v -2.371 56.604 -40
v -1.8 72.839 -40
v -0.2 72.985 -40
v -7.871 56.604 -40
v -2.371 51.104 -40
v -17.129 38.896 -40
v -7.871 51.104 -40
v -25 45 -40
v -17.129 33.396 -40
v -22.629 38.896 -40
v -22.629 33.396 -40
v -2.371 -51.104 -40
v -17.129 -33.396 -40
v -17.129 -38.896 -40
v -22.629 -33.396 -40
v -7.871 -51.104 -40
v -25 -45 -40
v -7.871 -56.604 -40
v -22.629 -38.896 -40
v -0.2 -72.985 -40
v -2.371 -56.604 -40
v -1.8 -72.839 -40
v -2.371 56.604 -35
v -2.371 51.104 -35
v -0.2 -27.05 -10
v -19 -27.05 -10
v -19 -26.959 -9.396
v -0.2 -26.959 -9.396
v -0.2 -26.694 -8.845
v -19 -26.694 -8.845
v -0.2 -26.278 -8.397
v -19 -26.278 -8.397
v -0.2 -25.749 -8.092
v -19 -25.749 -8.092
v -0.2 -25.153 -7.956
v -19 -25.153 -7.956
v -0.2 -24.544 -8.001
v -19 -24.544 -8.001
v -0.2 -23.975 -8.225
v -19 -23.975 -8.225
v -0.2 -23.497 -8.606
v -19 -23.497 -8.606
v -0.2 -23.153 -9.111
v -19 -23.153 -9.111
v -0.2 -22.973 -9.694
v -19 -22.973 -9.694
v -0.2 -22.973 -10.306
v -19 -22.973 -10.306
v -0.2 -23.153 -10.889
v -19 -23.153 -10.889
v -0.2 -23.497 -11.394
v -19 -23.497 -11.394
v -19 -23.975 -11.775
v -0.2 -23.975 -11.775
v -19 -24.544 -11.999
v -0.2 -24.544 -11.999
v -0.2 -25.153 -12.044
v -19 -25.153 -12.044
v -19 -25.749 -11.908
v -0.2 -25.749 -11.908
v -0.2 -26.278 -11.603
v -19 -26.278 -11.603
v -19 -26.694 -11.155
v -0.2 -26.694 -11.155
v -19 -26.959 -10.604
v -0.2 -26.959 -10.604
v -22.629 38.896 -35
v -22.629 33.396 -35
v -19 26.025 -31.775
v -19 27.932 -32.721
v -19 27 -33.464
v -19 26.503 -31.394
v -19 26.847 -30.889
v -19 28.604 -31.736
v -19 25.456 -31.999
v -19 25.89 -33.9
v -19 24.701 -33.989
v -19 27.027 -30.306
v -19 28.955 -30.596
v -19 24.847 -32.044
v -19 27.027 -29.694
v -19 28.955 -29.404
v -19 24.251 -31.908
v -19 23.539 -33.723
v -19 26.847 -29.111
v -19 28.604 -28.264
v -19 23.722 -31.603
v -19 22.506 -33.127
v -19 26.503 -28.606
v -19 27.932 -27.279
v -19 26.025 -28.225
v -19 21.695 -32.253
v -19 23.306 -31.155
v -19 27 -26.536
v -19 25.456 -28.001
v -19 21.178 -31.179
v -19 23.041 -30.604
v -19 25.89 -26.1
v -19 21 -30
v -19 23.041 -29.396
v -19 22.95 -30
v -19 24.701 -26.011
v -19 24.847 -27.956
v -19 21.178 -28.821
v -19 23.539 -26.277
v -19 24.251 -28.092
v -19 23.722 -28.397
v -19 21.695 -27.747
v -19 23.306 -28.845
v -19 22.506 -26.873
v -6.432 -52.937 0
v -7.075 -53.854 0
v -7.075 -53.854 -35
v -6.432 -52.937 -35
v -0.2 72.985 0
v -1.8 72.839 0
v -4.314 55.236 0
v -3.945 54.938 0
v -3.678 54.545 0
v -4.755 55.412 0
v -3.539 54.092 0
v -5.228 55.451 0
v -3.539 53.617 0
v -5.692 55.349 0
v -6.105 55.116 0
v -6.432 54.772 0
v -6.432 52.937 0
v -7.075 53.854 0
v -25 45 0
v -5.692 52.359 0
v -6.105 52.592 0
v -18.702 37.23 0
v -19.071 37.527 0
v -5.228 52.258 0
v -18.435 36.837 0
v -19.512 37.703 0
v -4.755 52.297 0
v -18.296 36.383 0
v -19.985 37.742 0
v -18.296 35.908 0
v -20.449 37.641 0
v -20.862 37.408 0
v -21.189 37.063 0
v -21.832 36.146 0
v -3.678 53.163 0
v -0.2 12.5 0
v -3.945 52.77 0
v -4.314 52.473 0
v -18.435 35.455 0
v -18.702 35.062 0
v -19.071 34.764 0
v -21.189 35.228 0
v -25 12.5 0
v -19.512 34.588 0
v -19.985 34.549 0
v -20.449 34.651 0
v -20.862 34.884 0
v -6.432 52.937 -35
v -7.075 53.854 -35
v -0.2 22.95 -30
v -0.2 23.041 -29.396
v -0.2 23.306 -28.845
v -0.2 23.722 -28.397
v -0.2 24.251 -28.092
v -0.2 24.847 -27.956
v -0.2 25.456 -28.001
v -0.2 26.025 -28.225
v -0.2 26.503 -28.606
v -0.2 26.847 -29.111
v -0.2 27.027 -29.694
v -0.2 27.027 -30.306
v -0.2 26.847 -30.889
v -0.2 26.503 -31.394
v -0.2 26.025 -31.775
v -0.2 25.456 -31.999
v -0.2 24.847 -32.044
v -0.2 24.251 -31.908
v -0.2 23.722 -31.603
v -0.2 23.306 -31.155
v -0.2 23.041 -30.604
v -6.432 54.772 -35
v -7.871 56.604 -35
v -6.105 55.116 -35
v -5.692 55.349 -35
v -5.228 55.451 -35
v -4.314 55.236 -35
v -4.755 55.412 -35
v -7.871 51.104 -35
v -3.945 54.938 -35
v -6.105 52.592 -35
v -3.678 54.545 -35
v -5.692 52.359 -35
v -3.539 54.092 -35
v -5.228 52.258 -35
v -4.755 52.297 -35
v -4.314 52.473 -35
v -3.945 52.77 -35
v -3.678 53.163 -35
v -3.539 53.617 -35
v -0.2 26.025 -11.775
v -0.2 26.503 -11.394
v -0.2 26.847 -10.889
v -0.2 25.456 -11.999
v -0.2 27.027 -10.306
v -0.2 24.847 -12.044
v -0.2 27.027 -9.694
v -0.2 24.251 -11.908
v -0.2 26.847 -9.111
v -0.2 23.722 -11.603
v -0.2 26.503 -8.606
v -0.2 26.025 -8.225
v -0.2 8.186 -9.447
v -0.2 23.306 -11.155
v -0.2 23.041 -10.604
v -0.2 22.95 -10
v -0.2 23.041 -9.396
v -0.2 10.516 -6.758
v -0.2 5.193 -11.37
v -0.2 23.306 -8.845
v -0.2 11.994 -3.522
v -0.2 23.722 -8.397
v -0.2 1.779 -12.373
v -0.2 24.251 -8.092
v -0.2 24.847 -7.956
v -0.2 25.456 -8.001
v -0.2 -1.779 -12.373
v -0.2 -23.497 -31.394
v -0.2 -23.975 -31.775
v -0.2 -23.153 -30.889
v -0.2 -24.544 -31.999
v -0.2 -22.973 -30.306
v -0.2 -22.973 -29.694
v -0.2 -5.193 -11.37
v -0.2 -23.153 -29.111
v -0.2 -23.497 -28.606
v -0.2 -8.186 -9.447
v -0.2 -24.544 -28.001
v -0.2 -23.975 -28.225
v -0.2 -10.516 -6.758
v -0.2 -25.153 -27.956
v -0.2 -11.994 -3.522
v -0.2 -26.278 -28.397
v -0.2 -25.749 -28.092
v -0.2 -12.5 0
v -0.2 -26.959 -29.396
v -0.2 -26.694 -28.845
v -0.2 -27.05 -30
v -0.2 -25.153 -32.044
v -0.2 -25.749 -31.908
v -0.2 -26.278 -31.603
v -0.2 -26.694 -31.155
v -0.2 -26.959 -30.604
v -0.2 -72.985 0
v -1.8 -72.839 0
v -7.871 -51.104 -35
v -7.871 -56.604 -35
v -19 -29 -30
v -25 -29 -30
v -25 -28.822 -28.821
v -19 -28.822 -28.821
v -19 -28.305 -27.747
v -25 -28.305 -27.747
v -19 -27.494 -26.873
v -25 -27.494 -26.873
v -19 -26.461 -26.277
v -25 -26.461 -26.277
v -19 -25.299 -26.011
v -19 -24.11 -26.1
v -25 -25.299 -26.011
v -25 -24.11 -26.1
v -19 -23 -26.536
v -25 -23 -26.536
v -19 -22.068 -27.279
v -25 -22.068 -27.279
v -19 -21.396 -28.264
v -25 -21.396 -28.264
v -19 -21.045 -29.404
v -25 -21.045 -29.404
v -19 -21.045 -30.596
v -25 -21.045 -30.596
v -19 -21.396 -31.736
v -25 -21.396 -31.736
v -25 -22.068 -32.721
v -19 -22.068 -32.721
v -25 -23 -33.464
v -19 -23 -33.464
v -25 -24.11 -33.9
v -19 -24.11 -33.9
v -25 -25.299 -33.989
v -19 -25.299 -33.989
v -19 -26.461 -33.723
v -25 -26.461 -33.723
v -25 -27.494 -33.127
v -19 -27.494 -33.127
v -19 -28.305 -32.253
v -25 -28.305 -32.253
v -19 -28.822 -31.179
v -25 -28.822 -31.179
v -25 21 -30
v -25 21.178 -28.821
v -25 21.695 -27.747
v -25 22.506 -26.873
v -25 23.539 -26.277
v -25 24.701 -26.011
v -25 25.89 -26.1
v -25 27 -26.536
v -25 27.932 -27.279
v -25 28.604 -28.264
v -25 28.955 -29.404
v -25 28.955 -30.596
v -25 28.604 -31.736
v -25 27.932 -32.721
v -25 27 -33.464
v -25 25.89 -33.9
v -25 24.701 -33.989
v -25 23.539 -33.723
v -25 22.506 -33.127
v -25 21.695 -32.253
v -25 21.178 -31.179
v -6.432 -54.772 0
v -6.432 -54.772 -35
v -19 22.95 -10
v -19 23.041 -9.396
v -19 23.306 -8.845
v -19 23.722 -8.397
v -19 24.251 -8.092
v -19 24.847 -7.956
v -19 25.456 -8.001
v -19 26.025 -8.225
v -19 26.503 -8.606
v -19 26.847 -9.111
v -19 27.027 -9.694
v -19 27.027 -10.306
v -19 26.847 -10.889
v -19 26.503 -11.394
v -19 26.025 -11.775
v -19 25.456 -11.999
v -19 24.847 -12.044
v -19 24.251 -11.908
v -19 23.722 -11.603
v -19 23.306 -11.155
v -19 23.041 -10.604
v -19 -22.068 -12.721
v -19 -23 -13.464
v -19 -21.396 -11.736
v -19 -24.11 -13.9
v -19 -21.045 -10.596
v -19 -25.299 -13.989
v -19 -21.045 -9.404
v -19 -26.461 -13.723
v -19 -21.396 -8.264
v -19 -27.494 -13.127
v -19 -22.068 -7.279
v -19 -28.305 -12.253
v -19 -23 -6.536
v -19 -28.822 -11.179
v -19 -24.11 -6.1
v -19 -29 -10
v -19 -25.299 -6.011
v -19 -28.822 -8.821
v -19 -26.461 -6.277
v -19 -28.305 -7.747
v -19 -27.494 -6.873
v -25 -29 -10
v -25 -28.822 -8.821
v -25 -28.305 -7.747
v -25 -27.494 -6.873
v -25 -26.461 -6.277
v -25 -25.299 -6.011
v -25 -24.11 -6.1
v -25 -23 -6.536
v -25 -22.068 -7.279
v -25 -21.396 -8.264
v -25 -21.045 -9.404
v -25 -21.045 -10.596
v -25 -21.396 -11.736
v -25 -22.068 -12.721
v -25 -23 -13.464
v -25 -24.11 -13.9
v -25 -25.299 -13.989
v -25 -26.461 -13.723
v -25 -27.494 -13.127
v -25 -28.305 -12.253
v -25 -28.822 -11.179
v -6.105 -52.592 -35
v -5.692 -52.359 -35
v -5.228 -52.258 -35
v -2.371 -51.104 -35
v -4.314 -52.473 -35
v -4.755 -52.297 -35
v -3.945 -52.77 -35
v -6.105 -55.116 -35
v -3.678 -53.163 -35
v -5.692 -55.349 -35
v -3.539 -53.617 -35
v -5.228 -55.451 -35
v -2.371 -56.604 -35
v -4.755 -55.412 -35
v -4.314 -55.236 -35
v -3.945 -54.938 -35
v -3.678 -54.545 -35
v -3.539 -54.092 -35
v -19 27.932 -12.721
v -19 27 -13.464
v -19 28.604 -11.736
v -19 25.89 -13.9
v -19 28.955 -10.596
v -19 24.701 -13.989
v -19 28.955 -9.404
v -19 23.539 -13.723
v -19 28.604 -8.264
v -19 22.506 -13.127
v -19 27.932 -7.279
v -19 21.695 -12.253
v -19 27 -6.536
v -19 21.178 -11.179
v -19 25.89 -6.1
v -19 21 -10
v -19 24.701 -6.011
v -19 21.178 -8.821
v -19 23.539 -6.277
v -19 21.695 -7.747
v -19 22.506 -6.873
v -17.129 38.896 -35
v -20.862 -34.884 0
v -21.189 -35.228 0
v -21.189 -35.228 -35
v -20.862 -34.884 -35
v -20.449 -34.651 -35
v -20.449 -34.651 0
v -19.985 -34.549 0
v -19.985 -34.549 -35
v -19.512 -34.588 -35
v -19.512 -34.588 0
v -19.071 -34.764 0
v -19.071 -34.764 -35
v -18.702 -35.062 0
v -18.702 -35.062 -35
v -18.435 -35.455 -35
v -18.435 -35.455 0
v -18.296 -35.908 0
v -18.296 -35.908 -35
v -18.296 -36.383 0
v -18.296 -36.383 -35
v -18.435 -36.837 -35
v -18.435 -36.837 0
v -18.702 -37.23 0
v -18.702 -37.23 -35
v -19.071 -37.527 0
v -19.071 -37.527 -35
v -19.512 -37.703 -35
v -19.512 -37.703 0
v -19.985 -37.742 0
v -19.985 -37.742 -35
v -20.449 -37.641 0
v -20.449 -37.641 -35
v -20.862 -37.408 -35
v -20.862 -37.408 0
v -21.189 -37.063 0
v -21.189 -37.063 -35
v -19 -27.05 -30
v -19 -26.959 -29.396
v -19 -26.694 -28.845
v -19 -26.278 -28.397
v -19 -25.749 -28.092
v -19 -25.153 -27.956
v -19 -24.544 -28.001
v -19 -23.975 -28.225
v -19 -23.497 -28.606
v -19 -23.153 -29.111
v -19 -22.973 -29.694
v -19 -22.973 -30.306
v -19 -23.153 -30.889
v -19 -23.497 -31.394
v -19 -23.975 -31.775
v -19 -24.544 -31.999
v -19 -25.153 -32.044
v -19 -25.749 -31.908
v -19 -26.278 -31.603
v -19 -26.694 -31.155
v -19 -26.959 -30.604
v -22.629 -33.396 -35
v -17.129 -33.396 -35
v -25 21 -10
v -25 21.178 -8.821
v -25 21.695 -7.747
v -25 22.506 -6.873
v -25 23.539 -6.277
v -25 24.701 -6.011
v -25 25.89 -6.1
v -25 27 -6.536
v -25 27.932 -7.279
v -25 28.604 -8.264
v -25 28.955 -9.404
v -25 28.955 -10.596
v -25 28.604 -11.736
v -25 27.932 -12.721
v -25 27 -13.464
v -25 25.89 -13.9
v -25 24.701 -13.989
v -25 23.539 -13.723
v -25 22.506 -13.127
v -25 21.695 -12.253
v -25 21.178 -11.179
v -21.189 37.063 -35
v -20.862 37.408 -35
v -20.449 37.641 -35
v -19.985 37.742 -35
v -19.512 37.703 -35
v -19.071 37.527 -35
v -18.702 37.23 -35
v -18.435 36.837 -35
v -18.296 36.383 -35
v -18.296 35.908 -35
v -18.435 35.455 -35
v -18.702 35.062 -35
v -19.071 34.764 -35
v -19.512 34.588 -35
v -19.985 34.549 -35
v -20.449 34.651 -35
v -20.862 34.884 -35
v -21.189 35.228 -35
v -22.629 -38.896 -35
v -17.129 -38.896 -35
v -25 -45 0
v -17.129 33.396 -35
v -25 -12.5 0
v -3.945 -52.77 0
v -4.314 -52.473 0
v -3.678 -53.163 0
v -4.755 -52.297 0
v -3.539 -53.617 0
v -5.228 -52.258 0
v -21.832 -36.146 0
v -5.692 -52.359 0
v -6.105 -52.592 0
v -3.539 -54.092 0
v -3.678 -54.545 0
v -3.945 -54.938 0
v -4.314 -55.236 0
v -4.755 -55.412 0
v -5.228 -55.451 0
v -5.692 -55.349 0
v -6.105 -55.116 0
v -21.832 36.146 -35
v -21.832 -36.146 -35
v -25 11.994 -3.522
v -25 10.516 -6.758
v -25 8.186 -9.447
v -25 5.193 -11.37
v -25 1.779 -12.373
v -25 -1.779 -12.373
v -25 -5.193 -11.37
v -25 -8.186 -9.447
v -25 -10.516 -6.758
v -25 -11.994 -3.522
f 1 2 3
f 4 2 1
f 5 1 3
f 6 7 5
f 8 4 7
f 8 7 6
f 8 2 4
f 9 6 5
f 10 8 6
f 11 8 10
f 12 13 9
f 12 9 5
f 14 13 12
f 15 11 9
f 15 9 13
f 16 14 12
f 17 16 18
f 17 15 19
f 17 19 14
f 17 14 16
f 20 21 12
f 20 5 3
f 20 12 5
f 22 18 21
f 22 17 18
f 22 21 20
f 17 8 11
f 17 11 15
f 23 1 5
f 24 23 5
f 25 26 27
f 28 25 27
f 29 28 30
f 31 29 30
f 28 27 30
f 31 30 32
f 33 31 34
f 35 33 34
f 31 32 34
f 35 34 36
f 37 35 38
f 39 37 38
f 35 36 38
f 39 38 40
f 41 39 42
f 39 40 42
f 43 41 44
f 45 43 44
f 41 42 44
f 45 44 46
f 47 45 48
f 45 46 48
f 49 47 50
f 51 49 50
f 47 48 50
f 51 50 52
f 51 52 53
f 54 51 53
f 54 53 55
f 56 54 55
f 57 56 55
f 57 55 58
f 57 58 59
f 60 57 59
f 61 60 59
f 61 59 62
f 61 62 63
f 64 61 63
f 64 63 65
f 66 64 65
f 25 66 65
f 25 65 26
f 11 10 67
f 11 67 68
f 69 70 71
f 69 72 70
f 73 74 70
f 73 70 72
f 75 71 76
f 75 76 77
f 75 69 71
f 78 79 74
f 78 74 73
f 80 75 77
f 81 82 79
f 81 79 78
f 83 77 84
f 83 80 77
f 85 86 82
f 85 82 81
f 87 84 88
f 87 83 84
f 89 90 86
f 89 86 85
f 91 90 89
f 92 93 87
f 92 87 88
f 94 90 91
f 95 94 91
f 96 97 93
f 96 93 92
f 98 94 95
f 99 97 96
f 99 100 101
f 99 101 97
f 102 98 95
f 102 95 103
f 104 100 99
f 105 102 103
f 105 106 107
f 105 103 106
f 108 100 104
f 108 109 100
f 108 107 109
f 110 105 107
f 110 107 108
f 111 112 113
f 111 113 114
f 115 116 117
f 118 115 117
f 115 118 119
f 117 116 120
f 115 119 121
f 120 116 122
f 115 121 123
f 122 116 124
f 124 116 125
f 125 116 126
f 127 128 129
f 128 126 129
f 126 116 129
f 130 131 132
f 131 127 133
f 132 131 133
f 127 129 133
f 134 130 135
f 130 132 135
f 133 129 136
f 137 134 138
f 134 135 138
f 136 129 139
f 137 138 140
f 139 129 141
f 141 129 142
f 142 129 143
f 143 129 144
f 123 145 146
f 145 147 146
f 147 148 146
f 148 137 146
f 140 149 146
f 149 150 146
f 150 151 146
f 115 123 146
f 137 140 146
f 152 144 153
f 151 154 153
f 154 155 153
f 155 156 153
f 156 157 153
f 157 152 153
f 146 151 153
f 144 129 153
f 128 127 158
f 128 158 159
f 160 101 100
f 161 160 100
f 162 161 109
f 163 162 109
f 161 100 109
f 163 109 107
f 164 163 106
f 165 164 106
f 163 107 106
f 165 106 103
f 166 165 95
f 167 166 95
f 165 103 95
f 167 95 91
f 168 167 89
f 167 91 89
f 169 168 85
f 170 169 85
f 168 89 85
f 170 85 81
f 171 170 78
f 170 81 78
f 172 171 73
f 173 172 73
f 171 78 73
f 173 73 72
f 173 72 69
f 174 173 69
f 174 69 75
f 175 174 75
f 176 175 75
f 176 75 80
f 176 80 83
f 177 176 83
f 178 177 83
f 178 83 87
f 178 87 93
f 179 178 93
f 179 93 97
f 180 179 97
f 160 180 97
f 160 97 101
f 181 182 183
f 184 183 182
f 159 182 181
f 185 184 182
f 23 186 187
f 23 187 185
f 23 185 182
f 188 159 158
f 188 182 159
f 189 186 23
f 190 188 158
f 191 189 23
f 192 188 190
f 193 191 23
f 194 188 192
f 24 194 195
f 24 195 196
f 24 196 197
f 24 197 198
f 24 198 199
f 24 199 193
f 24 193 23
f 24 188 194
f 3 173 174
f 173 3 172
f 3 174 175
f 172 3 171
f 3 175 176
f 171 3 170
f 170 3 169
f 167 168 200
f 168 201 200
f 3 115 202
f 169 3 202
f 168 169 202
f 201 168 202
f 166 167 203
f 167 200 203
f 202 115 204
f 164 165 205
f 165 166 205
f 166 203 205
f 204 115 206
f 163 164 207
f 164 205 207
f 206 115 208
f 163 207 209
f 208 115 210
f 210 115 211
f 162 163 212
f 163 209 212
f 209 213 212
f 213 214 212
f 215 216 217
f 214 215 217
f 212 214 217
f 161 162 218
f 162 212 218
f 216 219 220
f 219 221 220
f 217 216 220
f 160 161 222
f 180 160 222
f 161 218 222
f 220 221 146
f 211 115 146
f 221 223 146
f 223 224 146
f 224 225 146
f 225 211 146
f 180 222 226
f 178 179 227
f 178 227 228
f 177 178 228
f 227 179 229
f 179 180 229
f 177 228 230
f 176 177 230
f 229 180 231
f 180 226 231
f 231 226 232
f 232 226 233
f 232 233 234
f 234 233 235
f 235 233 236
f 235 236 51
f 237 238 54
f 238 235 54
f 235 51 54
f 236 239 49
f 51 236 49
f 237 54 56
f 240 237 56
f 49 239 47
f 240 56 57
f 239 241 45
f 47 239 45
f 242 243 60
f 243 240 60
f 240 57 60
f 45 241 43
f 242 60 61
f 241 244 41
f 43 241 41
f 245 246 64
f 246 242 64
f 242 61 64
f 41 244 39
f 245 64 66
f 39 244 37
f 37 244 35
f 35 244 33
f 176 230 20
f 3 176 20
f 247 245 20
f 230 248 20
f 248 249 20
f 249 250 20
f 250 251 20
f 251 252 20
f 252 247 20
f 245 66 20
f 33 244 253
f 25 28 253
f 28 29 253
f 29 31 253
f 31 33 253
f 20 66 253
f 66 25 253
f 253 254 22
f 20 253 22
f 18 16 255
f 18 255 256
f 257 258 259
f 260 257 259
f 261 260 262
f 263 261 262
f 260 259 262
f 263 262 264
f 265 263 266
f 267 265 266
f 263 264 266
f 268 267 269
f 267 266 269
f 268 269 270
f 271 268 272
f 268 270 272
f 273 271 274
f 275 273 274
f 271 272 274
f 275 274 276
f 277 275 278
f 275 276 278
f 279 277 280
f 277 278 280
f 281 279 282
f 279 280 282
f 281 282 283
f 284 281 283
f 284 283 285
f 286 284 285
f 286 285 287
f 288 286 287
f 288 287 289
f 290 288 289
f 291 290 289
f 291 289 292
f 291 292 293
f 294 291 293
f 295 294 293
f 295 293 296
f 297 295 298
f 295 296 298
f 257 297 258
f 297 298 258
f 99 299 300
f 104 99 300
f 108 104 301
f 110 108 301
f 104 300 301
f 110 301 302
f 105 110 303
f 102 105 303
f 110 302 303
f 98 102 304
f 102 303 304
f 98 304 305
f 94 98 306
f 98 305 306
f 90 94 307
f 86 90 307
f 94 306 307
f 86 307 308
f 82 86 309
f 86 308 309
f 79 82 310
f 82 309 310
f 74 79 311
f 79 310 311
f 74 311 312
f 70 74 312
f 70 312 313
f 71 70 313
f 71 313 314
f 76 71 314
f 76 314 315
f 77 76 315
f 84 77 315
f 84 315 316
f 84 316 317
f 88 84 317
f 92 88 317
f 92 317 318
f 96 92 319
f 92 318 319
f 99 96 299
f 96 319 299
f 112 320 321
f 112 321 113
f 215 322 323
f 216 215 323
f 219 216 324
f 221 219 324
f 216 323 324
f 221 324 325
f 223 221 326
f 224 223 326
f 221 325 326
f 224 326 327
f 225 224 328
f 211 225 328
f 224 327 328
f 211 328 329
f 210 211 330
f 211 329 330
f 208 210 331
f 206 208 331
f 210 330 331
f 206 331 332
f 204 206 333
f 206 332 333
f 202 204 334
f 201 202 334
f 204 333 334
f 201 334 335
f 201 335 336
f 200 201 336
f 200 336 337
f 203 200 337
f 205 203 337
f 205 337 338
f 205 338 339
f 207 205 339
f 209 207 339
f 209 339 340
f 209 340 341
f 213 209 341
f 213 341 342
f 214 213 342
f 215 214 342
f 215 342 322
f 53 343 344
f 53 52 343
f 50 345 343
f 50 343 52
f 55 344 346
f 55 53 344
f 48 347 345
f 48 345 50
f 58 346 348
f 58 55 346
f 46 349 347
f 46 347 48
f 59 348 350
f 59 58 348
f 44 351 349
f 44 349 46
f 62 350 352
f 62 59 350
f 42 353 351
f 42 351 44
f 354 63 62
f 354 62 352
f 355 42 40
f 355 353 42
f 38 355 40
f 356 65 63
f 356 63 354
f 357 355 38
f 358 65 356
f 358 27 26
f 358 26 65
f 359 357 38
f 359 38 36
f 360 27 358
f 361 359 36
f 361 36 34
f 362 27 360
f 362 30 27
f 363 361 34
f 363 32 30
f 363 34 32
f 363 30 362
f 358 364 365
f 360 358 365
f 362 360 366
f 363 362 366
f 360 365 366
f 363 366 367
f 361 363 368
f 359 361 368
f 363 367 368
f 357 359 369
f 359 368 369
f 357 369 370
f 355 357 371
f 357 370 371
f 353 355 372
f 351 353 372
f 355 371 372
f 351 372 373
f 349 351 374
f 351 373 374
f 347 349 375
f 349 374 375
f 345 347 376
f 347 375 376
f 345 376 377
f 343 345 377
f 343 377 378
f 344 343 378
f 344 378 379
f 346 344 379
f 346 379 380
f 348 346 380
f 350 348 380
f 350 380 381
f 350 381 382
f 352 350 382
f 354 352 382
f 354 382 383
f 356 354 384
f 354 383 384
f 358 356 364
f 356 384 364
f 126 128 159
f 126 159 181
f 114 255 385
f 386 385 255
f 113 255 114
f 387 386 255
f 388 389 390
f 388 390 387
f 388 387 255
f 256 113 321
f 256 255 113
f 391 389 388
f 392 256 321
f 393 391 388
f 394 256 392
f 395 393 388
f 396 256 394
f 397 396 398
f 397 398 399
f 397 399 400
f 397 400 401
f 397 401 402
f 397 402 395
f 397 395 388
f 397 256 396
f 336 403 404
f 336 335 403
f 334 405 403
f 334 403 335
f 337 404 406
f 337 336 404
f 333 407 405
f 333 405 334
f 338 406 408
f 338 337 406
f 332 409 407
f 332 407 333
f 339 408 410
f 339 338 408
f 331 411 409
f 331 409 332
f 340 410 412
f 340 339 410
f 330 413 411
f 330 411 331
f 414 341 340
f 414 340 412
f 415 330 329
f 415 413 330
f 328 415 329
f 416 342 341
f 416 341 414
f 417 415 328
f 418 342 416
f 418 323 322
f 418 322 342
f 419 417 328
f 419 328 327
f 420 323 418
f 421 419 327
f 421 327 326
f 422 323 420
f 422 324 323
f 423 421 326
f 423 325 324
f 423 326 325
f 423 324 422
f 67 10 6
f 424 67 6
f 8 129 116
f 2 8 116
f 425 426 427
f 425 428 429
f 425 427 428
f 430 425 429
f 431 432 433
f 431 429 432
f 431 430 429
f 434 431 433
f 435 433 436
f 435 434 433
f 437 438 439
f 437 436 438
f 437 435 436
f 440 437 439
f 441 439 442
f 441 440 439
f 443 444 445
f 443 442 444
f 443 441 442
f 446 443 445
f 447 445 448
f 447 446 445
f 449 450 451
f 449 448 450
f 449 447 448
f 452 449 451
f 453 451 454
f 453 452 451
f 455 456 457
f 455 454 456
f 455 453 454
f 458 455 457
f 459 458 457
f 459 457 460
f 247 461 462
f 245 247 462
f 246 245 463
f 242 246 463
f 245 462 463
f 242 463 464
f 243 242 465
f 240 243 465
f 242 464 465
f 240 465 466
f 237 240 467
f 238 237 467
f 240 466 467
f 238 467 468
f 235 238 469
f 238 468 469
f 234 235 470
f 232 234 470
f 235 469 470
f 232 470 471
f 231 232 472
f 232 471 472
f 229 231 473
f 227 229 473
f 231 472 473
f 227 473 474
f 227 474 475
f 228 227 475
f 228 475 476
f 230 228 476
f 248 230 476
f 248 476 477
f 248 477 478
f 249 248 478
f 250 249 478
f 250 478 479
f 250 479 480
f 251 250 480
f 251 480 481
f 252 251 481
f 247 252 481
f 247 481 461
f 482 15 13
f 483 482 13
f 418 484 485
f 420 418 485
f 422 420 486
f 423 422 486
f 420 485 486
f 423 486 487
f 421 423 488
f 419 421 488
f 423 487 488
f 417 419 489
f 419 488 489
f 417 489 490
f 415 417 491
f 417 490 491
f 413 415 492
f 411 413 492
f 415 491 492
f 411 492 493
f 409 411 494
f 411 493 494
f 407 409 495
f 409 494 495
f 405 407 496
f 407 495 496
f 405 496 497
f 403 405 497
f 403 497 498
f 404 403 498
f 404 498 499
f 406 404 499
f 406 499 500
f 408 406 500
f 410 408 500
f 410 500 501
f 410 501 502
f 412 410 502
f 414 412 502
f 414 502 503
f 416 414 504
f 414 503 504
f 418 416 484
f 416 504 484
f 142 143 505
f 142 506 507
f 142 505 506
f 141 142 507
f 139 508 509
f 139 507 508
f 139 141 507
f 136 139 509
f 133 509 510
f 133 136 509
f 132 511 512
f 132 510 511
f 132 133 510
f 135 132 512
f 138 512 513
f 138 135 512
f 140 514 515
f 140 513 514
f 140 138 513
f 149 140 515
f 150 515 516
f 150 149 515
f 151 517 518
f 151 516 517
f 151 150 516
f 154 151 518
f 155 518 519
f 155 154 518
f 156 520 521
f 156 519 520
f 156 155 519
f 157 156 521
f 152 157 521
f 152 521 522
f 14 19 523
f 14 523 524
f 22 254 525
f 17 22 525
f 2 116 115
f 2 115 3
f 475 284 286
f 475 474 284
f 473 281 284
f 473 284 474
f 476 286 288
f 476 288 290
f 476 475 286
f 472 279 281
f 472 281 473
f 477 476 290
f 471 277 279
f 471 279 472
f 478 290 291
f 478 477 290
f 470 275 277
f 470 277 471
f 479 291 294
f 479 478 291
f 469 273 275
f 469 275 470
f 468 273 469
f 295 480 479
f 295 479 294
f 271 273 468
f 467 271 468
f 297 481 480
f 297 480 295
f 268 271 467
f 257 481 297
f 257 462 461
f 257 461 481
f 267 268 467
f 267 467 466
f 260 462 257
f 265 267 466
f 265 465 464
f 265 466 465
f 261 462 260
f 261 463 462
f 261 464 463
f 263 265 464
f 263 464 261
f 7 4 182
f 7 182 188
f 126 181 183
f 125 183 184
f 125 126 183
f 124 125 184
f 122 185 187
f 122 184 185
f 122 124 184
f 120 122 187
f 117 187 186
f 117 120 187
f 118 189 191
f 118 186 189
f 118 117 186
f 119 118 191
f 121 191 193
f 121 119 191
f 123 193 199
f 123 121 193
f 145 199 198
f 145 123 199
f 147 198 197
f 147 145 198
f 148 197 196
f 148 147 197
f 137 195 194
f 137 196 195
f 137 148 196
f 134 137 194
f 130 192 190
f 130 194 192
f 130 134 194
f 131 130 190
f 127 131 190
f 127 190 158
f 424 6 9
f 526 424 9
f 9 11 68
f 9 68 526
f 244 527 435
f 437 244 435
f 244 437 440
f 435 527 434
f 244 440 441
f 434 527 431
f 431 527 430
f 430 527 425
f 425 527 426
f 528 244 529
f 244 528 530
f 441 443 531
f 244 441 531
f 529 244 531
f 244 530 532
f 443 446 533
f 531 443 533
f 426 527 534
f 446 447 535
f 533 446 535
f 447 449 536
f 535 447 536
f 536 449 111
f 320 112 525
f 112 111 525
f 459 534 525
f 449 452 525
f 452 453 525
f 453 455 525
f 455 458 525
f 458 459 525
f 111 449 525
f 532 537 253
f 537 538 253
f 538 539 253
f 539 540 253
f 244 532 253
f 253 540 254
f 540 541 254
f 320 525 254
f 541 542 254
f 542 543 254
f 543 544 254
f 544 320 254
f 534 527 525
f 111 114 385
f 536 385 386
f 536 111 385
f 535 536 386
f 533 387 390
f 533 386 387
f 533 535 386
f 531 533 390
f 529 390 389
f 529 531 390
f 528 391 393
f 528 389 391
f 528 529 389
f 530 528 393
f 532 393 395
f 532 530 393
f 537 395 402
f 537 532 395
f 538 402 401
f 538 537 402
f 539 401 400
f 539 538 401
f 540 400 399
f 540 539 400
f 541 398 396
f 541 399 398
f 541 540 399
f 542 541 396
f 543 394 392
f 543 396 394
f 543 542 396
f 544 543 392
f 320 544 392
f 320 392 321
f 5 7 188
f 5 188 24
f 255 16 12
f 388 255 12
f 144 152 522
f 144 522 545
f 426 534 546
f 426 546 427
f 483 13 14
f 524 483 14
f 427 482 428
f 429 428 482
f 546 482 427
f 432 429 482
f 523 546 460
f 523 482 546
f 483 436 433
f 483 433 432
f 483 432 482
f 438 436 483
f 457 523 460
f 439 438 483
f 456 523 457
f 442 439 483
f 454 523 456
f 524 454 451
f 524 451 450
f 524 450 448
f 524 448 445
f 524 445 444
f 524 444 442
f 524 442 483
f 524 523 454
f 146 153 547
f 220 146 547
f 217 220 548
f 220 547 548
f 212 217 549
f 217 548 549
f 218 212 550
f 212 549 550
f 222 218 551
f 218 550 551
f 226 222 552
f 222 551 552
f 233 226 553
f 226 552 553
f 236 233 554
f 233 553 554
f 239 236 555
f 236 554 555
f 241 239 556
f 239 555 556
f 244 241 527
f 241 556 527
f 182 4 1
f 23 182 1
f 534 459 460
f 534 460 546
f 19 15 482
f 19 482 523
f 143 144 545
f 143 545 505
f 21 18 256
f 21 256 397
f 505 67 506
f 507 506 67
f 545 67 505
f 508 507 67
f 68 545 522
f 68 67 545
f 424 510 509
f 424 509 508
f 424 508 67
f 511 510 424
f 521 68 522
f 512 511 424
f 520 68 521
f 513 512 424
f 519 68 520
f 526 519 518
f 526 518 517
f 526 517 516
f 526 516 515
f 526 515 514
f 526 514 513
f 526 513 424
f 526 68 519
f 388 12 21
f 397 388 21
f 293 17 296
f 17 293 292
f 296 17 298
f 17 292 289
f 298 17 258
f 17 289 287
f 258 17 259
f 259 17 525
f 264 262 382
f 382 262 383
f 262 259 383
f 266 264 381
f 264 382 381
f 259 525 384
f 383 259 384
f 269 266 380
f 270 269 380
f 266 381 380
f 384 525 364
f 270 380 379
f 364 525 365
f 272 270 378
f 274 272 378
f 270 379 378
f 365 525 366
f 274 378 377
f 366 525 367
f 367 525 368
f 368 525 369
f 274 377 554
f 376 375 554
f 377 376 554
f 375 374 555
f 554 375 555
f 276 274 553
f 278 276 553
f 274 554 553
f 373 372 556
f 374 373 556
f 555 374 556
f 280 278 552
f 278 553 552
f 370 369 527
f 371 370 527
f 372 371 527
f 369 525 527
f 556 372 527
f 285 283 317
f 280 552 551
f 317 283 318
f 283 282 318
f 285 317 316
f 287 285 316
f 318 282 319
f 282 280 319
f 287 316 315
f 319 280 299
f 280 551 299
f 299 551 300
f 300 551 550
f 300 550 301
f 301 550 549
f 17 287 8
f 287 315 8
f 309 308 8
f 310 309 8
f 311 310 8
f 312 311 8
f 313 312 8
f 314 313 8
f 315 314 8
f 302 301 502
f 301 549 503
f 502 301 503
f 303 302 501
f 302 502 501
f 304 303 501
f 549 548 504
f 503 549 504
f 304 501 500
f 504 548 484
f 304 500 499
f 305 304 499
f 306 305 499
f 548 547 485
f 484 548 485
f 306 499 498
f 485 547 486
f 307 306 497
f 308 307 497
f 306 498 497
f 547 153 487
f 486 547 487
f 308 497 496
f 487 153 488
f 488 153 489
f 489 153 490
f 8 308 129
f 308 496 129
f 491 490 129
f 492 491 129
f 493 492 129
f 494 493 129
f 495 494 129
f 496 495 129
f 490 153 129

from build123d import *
from OCP.BRepFilletAPI import BRepFilletAPI_MakeChamfer

# Parameters (mm, degrees)
BOSS_EXTRUDE1_DEPTH = 40
SKETCH2_R           = 2.05
CUT_EXTRUDE1_DEPTH  = 89.340803709
SKETCH2_4_R         = 4
SKETCH2_4_R_2       = 2.05
CUT_EXTRUDE2_DEPTH  = 6
CHAMFER1_SIZE       = 2.5
CHAMFER1_SIZE2      = 1.775056745
SKETCH3_W           = 5.5
SKETCH3_H           = 5.5
CUT_EXTRUDE3_DEPTH  = 5


with BuildPart() as part:
    # Sketch1 → Boss-Extrude1 (new body)
    with BuildSketch(Plane(origin=(0, 0, 0), x_dir=(0, 1, 0), z_dir=(0, 0, 1))):
        Polygon((-45, 25), (45, 25), (74.76, 0.2), (-74.76, 0.2), align=None)
        with BuildLine():
            Line((-54.771952061, 6.432118468), (-53.854229763, 7.074714539))
            Line((-53.854229763, 7.074714539), (-52.936507465, 6.432118468))
            ThreePointArc((-52.936507465, 6.432118468), (-53.854229763, 3.521475197), (-54.771952061, 6.432118468))
        make_face(mode=Mode.SUBTRACT)
        with BuildLine():
            Line((-37.063492535, 21.189168074), (-36.145770237, 21.831764145))
            Line((-36.145770237, 21.831764145), (-35.228047939, 21.189168074))
            ThreePointArc((-35.228047939, 21.189168074), (-36.145770237, 18.278524803), (-37.063492535, 21.189168074))
        make_face(mode=Mode.SUBTRACT)
        with BuildLine():
            Line((35.228047939, 21.189168074), (36.145770237, 21.831764145))
            Line((36.145770237, 21.831764145), (37.063492535, 21.189168074))
            ThreePointArc((37.063492535, 21.189168074), (36.145770237, 18.278524803), (35.228047939, 21.189168074))
        make_face(mode=Mode.SUBTRACT)
        with BuildLine():
            Line((52.936507465, 6.432118468), (53.854229763, 7.074714539))
            Line((53.854229763, 7.074714539), (54.771952061, 6.432118468))
            ThreePointArc((54.771952061, 6.432118468), (53.854229763, 3.521475197), (52.936507465, 6.432118468))
        make_face(mode=Mode.SUBTRACT)
    extrude(amount=-BOSS_EXTRUDE1_DEPTH)

    # Sketch2 → Cut-Extrude1 (cut, through all)
    with BuildSketch(Plane(origin=(-25, 0, 0), x_dir=(0, -1, 0), z_dir=(-1, 0, 0))):
        with BuildLine():
            Line((12.5, 0), (-12.5, 0))
            ThreePointArc((-12.5, 0), (0, -12.5), (12.5, 0))
        make_face()
        with Locations((-25, -30)):
            Circle(SKETCH2_R)
        with Locations((-25, -10)):
            Circle(SKETCH2_R)
        with Locations((25, -10)):
            Circle(SKETCH2_R)
        with Locations((25, -30)):
            Circle(SKETCH2_R)
    extrude(amount=-CUT_EXTRUDE1_DEPTH, mode=Mode.SUBTRACT)

    # Sketch2<4> → Cut-Extrude2 (cut)
    # profile 1 of 5: a face of its own
    with BuildSketch(Plane(origin=(-25, 0, 0), x_dir=(0, -1, 0), z_dir=(-1, 0, 0))):
        with Locations((-25, -10)):
            Circle(SKETCH2_4_R)
        with Locations((-25, -10)):
            Circle(SKETCH2_4_R_2, mode=Mode.SUBTRACT)
    # profile 2 of 5: a face of its own
    with BuildSketch(Plane(origin=(-25, 0, 0), x_dir=(0, -1, 0), z_dir=(-1, 0, 0))):
        with Locations((-25, -30)):
            Circle(SKETCH2_4_R)
        with Locations((-25, -30)):
            Circle(SKETCH2_4_R_2, mode=Mode.SUBTRACT)
    # profile 3 of 5: a face of its own
    with BuildSketch(Plane(origin=(-25, 0, 0), x_dir=(0, -1, 0), z_dir=(-1, 0, 0))):
        with Locations((25, -10)):
            Circle(SKETCH2_4_R)
        with Locations((25, -10)):
            Circle(SKETCH2_4_R_2, mode=Mode.SUBTRACT)
    # profile 4 of 5: a face of its own
    with BuildSketch(Plane(origin=(-25, 0, 0), x_dir=(0, -1, 0), z_dir=(-1, 0, 0))):
        with Locations((25, -30)):
            Circle(SKETCH2_4_R)
        with Locations((25, -30)):
            Circle(SKETCH2_4_R_2, mode=Mode.SUBTRACT)
    # profile 5 of 5: a face of its own
    with BuildSketch(Plane(origin=(-25, 0, 0), x_dir=(0, -1, 0), z_dir=(-1, 0, 0))):
        with BuildLine():
            Line((-12.5, 0), (12.5, 0))
            ThreePointArc((12.5, 0), (0, -12.5), (-12.5, 0))
        make_face()
    extrude(amount=-CUT_EXTRUDE2_DEPTH, mode=Mode.SUBTRACT)

    # Chamfer1: one chamfer whose edges measure the first distance from different faces: ONE call of the kernel's chamfer builder (chamfer() names one face for all edges)
    chamfer1_edges_1 = [part.edges().sort_by_distance(p)[0] for p in [
        (-0.2, -74.76, -20),
    ]]
    chamfer1_side_1 = [part.faces().sort_by_distance(p)[0] for p in [
        (-12.6, -59.88, -20),
    ]]
    chamfer1_edges_2 = [part.edges().sort_by_distance(p)[0] for p in [
        (-0.2, 74.76, -20),
    ]]
    chamfer1_side_2 = [part.faces().sort_by_distance(p)[0] for p in [
        (-12.6, 59.88, -20),
    ]]
    chamfer1 = BRepFilletAPI_MakeChamfer(part.part.solid().wrapped)
    for e in chamfer1_edges_1:
        chamfer1.Add(CHAMFER1_SIZE, CHAMFER1_SIZE2, e.wrapped, chamfer1_side_1[0].wrapped)  # the first distance lies on this face
    for e in chamfer1_edges_2:
        chamfer1.Add(CHAMFER1_SIZE, CHAMFER1_SIZE2, e.wrapped, chamfer1_side_2[0].wrapped)  # the first distance lies on this face
    add(Compound.cast(chamfer1.Shape()), mode=Mode.REPLACE)

    # Sketch3 → Cut-Extrude3 (cut)
    with BuildSketch(Plane(origin=(0, 0, -40), x_dir=(1, 0, 0), z_dir=(0, 0, -1))):
        with Locations((-19.878524803, 36.145770237)):
            Rectangle(SKETCH3_W, SKETCH3_H)
        with Locations((-5.121475197, 53.854229763)):
            Rectangle(SKETCH3_W, SKETCH3_H)
        with Locations((-19.878524803, -36.145770237)):
            Rectangle(SKETCH3_W, SKETCH3_H)
        with Locations((-5.121475197, -53.854229763)):
            Rectangle(SKETCH3_W, SKETCH3_H)
    extrude(amount=-CUT_EXTRUDE3_DEPTH, mode=Mode.SUBTRACT)


solid = part.part
